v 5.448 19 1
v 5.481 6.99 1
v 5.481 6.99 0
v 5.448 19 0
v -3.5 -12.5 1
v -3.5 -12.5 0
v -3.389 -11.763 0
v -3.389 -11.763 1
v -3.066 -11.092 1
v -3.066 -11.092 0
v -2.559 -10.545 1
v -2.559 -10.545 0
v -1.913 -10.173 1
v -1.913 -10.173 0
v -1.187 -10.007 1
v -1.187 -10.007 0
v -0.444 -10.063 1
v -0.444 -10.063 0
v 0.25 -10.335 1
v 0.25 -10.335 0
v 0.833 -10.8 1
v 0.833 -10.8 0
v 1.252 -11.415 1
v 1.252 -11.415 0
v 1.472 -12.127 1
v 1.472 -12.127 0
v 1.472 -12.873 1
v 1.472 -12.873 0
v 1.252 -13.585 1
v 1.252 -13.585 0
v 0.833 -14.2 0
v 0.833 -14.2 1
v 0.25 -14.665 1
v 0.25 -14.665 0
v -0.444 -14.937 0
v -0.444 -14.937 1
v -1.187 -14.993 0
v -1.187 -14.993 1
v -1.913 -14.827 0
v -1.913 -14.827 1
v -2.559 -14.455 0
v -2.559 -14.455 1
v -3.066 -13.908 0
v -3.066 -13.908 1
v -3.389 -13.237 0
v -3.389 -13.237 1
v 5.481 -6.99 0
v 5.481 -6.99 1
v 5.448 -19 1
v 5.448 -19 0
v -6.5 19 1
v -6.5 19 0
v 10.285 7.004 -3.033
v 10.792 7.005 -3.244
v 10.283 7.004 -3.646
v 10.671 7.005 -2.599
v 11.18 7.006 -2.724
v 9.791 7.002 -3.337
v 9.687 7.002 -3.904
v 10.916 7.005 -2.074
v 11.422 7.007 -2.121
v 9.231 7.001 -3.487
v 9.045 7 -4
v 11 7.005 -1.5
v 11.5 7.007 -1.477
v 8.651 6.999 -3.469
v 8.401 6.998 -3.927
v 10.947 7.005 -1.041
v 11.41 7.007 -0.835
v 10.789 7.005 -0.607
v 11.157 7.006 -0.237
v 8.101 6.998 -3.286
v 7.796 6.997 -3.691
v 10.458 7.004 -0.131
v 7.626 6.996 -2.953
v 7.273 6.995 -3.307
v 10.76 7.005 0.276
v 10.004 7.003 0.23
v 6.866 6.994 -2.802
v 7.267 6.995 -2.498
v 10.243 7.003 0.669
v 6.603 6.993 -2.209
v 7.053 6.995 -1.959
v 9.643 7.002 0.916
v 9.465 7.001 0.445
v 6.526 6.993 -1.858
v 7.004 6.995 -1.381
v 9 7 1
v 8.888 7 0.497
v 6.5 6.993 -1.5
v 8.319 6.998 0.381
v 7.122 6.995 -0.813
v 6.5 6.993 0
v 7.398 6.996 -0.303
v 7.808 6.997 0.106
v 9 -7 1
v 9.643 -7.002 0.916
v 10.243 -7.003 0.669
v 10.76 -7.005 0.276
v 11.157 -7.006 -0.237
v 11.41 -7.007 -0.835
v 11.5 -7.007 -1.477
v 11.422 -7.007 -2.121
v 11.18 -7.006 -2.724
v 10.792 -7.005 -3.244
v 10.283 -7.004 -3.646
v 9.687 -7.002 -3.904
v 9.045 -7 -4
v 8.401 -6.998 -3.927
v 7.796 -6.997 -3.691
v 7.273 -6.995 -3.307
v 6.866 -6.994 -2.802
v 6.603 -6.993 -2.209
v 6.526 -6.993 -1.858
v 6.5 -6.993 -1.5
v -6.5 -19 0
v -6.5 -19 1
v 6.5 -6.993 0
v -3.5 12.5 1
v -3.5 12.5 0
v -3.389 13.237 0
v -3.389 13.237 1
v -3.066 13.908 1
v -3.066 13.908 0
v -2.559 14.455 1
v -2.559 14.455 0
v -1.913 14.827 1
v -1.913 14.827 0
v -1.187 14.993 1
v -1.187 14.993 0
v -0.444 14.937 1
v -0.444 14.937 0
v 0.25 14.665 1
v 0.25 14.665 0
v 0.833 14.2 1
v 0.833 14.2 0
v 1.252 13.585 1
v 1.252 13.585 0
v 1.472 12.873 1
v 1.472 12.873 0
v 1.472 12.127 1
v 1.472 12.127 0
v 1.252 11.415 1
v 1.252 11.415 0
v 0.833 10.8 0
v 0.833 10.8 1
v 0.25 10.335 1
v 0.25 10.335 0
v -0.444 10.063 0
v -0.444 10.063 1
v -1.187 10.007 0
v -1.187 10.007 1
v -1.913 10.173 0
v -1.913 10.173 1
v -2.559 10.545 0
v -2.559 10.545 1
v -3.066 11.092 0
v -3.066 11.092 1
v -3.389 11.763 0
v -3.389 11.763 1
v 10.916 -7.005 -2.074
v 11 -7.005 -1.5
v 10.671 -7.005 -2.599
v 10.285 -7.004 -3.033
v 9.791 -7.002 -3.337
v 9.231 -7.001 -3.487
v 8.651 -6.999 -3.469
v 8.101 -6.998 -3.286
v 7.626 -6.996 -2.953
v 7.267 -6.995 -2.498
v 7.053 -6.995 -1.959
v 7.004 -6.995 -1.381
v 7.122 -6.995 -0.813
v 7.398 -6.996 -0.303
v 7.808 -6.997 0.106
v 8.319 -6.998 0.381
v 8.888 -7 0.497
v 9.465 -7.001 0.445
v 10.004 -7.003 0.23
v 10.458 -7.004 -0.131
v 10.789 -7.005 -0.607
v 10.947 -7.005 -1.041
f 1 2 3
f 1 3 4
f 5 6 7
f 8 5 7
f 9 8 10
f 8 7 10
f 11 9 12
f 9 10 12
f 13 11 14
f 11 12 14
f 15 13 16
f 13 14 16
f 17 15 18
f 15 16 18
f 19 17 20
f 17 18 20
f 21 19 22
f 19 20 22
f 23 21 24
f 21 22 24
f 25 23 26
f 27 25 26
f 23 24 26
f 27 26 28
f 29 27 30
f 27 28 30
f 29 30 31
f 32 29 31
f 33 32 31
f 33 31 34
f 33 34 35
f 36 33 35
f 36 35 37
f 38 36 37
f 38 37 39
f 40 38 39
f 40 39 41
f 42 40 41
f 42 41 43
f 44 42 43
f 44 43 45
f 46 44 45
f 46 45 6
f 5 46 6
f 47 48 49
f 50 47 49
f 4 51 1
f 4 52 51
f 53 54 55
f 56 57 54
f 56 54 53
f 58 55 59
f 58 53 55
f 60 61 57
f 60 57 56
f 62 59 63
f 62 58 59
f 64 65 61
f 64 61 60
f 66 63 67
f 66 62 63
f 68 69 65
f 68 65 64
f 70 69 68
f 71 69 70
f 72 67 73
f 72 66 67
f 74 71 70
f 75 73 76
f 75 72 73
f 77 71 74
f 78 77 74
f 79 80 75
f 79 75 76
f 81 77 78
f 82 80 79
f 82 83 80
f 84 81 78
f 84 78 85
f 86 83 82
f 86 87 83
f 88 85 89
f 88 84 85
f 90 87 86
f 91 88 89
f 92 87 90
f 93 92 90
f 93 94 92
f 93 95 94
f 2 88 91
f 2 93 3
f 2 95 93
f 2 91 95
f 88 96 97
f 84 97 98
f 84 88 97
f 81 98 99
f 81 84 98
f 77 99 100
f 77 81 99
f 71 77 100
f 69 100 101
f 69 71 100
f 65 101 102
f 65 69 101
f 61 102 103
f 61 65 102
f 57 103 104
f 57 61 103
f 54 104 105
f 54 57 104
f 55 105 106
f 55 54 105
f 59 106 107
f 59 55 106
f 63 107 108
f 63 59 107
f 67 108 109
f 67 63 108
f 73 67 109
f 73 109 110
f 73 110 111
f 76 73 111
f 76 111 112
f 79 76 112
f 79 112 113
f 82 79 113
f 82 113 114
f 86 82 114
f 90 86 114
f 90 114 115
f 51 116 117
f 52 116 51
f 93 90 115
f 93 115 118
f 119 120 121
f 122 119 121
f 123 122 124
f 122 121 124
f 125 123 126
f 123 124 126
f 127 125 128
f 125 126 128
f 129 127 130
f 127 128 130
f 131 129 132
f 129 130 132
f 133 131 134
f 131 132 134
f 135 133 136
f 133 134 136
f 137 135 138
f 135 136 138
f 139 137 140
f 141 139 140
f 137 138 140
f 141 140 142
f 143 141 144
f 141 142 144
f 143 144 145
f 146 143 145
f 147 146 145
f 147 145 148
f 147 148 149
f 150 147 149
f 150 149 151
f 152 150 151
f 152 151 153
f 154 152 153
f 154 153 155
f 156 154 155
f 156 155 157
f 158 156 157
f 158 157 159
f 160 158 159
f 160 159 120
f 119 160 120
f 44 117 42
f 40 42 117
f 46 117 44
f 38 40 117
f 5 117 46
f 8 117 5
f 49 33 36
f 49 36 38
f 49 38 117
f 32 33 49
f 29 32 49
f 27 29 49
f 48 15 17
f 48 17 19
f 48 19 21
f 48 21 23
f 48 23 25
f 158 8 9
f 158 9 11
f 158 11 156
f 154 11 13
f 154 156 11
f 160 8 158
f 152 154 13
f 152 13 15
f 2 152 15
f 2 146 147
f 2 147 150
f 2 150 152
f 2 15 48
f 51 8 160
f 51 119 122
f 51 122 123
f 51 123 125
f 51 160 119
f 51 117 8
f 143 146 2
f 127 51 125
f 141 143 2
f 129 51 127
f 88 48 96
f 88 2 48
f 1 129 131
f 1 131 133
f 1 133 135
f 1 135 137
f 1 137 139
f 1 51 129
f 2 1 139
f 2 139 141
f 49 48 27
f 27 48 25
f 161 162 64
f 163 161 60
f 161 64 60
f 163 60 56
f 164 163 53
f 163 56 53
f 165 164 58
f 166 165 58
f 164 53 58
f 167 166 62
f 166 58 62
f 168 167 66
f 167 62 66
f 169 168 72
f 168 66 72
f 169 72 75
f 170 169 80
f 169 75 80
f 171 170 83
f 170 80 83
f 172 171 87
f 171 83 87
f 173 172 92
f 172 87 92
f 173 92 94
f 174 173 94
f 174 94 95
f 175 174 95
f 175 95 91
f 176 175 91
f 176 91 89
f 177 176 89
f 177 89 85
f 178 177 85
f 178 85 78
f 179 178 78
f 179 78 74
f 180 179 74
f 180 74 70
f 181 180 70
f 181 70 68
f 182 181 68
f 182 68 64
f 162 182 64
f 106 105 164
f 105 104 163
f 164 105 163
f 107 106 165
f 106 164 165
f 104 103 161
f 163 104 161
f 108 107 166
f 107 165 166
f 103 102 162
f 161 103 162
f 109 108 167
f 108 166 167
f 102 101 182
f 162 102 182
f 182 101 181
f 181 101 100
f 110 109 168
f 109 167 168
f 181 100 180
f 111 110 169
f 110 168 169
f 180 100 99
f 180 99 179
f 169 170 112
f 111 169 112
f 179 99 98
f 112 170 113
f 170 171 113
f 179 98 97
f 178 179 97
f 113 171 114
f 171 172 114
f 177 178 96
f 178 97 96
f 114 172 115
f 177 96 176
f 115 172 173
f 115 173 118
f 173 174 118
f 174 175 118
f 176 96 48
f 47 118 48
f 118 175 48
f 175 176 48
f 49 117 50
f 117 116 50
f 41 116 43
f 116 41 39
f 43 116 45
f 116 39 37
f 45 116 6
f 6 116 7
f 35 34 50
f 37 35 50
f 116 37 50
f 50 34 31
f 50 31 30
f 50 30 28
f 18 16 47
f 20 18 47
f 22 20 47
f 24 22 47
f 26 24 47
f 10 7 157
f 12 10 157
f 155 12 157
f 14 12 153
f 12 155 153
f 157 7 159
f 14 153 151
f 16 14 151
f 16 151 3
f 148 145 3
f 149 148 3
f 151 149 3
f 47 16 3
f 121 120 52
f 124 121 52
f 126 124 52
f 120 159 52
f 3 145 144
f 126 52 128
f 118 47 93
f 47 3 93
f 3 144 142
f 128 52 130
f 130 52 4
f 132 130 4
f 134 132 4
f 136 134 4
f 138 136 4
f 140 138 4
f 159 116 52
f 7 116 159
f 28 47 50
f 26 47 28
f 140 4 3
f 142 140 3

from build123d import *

# Parameters (mm, degrees)
SKETCH_1_W          = 13
SKETCH_1_H          = 38
EXTRUDE_1_DEPTH     = 1
SKETCH_2_R          = 2
EXTRUDE_2_DEPTH     = 38
CUT_EXTRUDE_2_DEPTH = 10
SKETCH_4_R          = 2.5
CUT_EXTRUDE_3_DEPTH = 2


with BuildPart() as part:
    # 草图1 → 凸台-拉伸1 (new body)
    with BuildSketch(Plane.XY):
        Rectangle(SKETCH_1_W, SKETCH_1_H)
    extrude(amount=EXTRUDE_1_DEPTH)

    # 草图2 → 凸台-拉伸2 (add)
    with BuildSketch(Plane(origin=(0, 19, 0), x_dir=(1, 0, 0), z_dir=(0, 1, 0))):
        with BuildLine():
            Line((6.5, -1), (9, -1))
            ThreePointArc((9, -1), (10.767766953, 3.267766953), (6.5, 1.5))
            Line((6.5, 1.5), (6.5, -1))
        make_face()
        with Locations((9, 1.5)):
            Circle(SKETCH_2_R, mode=Mode.SUBTRACT)
    extrude(amount=-EXTRUDE_2_DEPTH)

    # 草图3 → 切除-拉伸2 (cut)
    with BuildSketch(Plane.XY.offset(1)):
        Polygon((5.480957084, 6.99044612), (5.442845313, 20.990394244), (12.442819375, 21.00945013), (12.480931146, 7.009502005), align=None)
        Polygon((5.442845313, -20.990394244), (12.442819375, -21.00945013), (12.480931146, -7.009502005), (5.480957084, -6.99044612), align=None)
    extrude(amount=-CUT_EXTRUDE_2_DEPTH, mode=Mode.SUBTRACT)

    # 草图4 → 切除-拉伸3 (cut)
    with BuildSketch(Plane(origin=(0, 0, 0), x_dir=(-1, 0, 0), z_dir=(0, 0, -1))):
        with Locations((1, 12.5)):
            Circle(SKETCH_4_R)
        with Locations((1, -12.5)):
            Circle(SKETCH_4_R)
    extrude(amount=-CUT_EXTRUDE_3_DEPTH, mode=Mode.SUBTRACT)


solid = part.part
